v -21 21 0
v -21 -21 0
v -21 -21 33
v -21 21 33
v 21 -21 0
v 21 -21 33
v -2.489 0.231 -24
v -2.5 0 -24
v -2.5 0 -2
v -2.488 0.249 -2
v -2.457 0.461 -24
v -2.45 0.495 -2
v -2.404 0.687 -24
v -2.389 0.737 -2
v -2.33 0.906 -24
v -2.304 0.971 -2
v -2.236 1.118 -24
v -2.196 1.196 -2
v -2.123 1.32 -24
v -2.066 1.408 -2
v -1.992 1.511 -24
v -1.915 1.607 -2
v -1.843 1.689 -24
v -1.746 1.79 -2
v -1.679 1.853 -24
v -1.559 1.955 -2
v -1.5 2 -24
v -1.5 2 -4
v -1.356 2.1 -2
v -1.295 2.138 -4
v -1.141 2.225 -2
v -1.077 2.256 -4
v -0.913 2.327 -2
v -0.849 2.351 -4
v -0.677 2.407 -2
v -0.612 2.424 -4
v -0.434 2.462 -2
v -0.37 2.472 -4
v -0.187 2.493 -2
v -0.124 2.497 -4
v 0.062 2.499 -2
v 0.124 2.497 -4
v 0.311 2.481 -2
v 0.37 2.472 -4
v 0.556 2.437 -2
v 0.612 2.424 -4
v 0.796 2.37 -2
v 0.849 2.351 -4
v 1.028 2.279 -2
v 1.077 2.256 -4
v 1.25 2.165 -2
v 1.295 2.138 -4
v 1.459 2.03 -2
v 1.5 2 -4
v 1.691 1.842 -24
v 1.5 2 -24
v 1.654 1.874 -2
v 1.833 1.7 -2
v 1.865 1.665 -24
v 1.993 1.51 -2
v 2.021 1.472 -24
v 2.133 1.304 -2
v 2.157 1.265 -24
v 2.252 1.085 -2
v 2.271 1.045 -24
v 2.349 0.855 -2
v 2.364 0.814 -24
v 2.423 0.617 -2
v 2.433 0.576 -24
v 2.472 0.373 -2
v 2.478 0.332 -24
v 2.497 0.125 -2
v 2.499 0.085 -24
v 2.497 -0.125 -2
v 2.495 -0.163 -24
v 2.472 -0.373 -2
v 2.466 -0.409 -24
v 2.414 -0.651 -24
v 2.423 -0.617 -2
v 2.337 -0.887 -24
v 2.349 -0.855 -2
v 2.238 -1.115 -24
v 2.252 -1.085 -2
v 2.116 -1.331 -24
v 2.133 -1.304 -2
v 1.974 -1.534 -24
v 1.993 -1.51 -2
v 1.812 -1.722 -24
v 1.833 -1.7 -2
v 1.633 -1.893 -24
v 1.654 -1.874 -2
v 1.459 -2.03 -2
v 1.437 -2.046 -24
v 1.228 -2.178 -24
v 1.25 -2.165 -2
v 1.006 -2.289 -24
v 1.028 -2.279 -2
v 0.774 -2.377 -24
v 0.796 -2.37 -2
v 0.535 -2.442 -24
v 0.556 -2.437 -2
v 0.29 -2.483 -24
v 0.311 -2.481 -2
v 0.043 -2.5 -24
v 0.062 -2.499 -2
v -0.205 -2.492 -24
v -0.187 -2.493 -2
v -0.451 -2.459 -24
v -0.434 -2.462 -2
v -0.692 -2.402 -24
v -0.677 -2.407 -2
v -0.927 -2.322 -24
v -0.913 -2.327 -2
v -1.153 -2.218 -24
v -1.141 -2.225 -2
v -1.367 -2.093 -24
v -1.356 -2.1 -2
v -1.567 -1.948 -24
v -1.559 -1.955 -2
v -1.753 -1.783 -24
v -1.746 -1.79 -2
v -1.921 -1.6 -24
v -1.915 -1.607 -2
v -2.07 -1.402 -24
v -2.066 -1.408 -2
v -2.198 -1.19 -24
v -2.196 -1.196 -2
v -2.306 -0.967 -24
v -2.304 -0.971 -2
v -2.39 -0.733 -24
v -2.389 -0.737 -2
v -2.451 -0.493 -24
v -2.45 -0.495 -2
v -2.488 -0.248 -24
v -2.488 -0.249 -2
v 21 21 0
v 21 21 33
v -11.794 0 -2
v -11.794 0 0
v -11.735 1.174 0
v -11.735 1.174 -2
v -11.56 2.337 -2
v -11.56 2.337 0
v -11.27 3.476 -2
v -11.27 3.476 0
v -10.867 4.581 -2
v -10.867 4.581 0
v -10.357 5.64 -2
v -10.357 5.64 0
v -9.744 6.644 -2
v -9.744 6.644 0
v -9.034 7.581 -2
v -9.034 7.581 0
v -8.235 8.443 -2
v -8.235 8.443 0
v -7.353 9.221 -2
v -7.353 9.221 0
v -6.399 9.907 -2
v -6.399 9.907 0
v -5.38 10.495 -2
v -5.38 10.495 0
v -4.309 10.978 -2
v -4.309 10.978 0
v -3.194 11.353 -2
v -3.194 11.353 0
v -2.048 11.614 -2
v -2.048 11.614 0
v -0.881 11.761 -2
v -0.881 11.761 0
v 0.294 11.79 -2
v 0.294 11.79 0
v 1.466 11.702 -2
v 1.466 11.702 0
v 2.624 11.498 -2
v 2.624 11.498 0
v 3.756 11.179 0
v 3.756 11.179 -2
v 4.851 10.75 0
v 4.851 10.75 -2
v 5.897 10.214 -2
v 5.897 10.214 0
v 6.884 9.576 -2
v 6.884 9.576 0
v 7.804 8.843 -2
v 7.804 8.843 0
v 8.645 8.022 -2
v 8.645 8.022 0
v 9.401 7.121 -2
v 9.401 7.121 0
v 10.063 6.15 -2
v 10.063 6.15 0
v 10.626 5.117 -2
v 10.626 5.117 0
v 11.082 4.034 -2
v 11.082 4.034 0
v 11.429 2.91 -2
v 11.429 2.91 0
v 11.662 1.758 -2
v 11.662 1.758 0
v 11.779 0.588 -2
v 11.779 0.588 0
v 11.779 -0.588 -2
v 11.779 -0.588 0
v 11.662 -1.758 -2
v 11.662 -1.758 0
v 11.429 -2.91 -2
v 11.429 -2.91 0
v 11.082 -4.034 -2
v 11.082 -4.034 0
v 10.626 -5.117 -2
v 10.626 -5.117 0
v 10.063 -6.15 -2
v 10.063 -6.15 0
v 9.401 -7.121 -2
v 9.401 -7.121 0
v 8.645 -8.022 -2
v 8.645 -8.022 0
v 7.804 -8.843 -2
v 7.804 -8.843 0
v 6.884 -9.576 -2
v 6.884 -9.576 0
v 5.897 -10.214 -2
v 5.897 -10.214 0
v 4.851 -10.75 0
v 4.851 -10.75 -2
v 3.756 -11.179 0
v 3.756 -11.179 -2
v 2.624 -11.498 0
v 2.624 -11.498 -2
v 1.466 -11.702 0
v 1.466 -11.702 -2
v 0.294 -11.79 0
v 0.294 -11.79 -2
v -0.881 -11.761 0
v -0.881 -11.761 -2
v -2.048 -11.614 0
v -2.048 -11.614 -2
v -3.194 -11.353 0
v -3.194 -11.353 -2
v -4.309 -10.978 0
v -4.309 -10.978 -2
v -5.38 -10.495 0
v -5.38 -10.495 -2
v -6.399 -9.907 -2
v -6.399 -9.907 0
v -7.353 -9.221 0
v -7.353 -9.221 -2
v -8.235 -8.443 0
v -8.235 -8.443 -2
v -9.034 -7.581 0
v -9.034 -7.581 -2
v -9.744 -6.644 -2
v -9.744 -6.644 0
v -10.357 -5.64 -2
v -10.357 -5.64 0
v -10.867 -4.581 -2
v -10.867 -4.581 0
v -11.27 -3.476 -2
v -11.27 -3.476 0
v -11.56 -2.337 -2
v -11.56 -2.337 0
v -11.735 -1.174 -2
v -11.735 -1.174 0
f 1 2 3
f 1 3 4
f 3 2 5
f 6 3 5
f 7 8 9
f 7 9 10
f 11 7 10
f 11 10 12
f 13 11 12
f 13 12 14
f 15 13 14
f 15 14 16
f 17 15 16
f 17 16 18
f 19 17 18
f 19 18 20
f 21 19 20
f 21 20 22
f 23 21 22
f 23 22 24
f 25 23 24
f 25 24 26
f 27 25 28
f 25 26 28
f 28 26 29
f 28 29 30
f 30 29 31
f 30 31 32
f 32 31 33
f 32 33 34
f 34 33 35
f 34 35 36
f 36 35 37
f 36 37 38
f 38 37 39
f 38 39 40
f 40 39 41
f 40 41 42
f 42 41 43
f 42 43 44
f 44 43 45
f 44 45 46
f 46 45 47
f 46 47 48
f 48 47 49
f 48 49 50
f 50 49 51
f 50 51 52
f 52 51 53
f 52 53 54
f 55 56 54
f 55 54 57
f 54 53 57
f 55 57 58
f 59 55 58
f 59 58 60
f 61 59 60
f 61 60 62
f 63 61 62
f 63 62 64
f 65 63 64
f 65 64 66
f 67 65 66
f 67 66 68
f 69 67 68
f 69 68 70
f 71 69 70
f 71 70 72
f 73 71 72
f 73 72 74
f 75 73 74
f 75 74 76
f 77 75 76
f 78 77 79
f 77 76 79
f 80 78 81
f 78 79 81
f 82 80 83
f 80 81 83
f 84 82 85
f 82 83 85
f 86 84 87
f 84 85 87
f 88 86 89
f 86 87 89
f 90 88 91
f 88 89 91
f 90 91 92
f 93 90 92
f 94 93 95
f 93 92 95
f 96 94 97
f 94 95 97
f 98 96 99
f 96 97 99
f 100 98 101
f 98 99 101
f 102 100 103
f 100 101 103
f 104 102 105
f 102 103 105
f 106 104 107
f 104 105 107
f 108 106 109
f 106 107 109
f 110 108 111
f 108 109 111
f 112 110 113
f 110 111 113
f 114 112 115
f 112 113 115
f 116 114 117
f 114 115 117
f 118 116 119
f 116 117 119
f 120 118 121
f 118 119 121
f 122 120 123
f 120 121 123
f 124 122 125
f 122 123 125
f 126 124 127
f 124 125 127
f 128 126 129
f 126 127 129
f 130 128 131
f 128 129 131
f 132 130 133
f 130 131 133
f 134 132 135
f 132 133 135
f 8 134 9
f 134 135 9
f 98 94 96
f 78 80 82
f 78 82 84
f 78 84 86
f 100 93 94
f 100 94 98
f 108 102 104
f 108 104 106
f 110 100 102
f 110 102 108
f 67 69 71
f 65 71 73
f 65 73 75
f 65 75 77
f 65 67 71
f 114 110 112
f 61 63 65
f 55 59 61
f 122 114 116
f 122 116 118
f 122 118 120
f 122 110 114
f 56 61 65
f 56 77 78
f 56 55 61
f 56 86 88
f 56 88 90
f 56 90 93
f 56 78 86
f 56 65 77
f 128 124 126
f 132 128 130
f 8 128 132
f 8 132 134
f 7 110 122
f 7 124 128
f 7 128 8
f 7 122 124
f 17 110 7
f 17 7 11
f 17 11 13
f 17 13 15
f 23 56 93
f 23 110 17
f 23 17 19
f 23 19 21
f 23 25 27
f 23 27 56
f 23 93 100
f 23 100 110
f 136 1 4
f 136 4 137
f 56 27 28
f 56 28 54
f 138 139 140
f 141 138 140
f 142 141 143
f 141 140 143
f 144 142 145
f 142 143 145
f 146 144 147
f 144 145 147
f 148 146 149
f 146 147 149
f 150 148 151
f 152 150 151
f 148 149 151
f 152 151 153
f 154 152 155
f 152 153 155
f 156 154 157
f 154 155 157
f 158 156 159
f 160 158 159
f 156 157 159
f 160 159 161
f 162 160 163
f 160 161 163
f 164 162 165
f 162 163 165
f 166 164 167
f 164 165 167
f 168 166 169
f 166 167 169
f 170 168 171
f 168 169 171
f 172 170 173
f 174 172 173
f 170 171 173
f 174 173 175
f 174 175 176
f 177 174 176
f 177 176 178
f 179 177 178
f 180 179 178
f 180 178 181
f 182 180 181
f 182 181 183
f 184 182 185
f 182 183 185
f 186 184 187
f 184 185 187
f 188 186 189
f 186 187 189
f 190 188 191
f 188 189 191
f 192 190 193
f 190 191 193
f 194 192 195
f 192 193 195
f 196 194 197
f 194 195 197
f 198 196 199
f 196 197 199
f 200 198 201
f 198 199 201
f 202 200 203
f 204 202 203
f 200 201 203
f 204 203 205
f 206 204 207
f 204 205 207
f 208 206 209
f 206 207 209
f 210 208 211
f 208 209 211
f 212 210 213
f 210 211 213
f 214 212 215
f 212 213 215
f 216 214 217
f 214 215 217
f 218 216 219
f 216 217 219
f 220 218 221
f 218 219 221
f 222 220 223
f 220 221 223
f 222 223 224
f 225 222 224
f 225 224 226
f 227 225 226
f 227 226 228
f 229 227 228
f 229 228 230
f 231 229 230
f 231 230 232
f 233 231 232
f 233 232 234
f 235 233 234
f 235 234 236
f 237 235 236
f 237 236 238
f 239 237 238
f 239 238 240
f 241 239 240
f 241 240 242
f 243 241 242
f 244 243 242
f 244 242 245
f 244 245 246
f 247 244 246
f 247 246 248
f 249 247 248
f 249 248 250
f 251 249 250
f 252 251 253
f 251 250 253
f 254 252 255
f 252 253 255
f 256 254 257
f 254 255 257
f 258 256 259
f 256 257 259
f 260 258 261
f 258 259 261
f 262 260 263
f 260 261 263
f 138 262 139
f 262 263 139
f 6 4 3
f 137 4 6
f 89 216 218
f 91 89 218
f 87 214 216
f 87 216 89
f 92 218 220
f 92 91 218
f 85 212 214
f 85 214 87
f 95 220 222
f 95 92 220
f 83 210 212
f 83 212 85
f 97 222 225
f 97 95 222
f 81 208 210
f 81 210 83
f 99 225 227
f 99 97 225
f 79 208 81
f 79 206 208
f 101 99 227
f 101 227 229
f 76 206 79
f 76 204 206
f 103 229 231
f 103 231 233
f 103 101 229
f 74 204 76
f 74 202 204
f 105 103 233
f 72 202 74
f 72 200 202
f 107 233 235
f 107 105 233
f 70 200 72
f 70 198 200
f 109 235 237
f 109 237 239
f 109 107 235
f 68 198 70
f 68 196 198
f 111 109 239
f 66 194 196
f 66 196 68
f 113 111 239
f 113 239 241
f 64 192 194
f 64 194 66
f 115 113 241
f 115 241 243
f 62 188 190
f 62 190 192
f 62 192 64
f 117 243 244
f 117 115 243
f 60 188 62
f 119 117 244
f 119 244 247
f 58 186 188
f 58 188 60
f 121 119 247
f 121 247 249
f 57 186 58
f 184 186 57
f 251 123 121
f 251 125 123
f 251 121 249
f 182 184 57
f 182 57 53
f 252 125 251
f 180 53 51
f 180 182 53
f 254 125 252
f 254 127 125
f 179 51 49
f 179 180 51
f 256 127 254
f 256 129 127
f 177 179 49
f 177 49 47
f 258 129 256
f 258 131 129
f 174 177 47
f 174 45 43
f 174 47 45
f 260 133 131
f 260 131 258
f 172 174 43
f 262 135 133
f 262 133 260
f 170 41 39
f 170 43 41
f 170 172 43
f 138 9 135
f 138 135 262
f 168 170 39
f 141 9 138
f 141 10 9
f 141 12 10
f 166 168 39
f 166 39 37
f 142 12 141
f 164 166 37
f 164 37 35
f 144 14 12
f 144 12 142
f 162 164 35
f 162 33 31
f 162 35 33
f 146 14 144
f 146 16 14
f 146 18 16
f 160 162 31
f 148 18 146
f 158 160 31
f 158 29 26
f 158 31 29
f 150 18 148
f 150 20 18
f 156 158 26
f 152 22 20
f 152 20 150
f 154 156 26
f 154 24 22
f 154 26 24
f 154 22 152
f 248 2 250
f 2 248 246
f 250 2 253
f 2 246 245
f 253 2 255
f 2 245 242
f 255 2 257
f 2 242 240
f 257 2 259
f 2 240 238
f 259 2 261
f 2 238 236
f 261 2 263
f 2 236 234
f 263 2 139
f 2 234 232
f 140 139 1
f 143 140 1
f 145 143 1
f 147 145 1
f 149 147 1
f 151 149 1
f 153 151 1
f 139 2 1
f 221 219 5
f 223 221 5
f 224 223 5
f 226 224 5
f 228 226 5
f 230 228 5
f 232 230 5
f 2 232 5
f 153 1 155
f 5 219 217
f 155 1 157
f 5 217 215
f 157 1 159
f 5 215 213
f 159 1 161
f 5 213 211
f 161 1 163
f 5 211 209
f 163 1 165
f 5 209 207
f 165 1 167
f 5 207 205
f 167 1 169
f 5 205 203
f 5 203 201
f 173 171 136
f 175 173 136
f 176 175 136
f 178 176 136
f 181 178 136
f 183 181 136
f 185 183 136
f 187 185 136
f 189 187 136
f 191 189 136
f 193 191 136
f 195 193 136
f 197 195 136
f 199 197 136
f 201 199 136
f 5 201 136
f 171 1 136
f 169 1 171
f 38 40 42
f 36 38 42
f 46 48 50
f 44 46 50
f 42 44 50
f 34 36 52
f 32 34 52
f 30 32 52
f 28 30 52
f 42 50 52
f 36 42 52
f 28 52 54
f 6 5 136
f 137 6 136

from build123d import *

# Parameters (mm, degrees)
SKETCH1_W           = 42
SKETCH1_H           = 42
BOSS_EXTRUDE1_DEPTH = 33
SKETCH2_R           = 11.793537184
BOSS_EXTRUDE2_DEPTH = 2
SKETCH3_R           = 2.5
BOSS_EXTRUDE3_DEPTH = 22
CUT_EXTRUDE1_DEPTH  = 20


with BuildPart() as part:
    # Sketch1 → Boss-Extrude1 (new body)
    with BuildSketch(Plane.XY):
        Rectangle(SKETCH1_W, SKETCH1_H)
    extrude(amount=BOSS_EXTRUDE1_DEPTH)

    # Sketch2 → Boss-Extrude2 (add)
    with BuildSketch(Plane(origin=(0, 0, 0), x_dir=(-1, 0, 0), z_dir=(0, 0, -1))):
        Circle(SKETCH2_R)
    extrude(amount=BOSS_EXTRUDE2_DEPTH)

    # Sketch3 → Boss-Extrude3 (add)
    with BuildSketch(Plane(origin=(0, 0, -2), x_dir=(-1, 0, 0), z_dir=(0, 0, -1))):
        Circle(SKETCH3_R)
    extrude(amount=BOSS_EXTRUDE3_DEPTH)

    # Sketch4 → Cut-Extrude1 (cut)
    with BuildSketch(Plane(origin=(0, 0, -24), x_dir=(-1, 0, 0), z_dir=(0, 0, -1))):
        with BuildLine():
            Line((1.5, 2), (-1.5, 2))
            ThreePointArc((-1.5, 2), (0, 2.5), (1.5, 2))
        make_face()
    extrude(amount=-CUT_EXTRUDE1_DEPTH, mode=Mode.SUBTRACT)


solid = part.part
